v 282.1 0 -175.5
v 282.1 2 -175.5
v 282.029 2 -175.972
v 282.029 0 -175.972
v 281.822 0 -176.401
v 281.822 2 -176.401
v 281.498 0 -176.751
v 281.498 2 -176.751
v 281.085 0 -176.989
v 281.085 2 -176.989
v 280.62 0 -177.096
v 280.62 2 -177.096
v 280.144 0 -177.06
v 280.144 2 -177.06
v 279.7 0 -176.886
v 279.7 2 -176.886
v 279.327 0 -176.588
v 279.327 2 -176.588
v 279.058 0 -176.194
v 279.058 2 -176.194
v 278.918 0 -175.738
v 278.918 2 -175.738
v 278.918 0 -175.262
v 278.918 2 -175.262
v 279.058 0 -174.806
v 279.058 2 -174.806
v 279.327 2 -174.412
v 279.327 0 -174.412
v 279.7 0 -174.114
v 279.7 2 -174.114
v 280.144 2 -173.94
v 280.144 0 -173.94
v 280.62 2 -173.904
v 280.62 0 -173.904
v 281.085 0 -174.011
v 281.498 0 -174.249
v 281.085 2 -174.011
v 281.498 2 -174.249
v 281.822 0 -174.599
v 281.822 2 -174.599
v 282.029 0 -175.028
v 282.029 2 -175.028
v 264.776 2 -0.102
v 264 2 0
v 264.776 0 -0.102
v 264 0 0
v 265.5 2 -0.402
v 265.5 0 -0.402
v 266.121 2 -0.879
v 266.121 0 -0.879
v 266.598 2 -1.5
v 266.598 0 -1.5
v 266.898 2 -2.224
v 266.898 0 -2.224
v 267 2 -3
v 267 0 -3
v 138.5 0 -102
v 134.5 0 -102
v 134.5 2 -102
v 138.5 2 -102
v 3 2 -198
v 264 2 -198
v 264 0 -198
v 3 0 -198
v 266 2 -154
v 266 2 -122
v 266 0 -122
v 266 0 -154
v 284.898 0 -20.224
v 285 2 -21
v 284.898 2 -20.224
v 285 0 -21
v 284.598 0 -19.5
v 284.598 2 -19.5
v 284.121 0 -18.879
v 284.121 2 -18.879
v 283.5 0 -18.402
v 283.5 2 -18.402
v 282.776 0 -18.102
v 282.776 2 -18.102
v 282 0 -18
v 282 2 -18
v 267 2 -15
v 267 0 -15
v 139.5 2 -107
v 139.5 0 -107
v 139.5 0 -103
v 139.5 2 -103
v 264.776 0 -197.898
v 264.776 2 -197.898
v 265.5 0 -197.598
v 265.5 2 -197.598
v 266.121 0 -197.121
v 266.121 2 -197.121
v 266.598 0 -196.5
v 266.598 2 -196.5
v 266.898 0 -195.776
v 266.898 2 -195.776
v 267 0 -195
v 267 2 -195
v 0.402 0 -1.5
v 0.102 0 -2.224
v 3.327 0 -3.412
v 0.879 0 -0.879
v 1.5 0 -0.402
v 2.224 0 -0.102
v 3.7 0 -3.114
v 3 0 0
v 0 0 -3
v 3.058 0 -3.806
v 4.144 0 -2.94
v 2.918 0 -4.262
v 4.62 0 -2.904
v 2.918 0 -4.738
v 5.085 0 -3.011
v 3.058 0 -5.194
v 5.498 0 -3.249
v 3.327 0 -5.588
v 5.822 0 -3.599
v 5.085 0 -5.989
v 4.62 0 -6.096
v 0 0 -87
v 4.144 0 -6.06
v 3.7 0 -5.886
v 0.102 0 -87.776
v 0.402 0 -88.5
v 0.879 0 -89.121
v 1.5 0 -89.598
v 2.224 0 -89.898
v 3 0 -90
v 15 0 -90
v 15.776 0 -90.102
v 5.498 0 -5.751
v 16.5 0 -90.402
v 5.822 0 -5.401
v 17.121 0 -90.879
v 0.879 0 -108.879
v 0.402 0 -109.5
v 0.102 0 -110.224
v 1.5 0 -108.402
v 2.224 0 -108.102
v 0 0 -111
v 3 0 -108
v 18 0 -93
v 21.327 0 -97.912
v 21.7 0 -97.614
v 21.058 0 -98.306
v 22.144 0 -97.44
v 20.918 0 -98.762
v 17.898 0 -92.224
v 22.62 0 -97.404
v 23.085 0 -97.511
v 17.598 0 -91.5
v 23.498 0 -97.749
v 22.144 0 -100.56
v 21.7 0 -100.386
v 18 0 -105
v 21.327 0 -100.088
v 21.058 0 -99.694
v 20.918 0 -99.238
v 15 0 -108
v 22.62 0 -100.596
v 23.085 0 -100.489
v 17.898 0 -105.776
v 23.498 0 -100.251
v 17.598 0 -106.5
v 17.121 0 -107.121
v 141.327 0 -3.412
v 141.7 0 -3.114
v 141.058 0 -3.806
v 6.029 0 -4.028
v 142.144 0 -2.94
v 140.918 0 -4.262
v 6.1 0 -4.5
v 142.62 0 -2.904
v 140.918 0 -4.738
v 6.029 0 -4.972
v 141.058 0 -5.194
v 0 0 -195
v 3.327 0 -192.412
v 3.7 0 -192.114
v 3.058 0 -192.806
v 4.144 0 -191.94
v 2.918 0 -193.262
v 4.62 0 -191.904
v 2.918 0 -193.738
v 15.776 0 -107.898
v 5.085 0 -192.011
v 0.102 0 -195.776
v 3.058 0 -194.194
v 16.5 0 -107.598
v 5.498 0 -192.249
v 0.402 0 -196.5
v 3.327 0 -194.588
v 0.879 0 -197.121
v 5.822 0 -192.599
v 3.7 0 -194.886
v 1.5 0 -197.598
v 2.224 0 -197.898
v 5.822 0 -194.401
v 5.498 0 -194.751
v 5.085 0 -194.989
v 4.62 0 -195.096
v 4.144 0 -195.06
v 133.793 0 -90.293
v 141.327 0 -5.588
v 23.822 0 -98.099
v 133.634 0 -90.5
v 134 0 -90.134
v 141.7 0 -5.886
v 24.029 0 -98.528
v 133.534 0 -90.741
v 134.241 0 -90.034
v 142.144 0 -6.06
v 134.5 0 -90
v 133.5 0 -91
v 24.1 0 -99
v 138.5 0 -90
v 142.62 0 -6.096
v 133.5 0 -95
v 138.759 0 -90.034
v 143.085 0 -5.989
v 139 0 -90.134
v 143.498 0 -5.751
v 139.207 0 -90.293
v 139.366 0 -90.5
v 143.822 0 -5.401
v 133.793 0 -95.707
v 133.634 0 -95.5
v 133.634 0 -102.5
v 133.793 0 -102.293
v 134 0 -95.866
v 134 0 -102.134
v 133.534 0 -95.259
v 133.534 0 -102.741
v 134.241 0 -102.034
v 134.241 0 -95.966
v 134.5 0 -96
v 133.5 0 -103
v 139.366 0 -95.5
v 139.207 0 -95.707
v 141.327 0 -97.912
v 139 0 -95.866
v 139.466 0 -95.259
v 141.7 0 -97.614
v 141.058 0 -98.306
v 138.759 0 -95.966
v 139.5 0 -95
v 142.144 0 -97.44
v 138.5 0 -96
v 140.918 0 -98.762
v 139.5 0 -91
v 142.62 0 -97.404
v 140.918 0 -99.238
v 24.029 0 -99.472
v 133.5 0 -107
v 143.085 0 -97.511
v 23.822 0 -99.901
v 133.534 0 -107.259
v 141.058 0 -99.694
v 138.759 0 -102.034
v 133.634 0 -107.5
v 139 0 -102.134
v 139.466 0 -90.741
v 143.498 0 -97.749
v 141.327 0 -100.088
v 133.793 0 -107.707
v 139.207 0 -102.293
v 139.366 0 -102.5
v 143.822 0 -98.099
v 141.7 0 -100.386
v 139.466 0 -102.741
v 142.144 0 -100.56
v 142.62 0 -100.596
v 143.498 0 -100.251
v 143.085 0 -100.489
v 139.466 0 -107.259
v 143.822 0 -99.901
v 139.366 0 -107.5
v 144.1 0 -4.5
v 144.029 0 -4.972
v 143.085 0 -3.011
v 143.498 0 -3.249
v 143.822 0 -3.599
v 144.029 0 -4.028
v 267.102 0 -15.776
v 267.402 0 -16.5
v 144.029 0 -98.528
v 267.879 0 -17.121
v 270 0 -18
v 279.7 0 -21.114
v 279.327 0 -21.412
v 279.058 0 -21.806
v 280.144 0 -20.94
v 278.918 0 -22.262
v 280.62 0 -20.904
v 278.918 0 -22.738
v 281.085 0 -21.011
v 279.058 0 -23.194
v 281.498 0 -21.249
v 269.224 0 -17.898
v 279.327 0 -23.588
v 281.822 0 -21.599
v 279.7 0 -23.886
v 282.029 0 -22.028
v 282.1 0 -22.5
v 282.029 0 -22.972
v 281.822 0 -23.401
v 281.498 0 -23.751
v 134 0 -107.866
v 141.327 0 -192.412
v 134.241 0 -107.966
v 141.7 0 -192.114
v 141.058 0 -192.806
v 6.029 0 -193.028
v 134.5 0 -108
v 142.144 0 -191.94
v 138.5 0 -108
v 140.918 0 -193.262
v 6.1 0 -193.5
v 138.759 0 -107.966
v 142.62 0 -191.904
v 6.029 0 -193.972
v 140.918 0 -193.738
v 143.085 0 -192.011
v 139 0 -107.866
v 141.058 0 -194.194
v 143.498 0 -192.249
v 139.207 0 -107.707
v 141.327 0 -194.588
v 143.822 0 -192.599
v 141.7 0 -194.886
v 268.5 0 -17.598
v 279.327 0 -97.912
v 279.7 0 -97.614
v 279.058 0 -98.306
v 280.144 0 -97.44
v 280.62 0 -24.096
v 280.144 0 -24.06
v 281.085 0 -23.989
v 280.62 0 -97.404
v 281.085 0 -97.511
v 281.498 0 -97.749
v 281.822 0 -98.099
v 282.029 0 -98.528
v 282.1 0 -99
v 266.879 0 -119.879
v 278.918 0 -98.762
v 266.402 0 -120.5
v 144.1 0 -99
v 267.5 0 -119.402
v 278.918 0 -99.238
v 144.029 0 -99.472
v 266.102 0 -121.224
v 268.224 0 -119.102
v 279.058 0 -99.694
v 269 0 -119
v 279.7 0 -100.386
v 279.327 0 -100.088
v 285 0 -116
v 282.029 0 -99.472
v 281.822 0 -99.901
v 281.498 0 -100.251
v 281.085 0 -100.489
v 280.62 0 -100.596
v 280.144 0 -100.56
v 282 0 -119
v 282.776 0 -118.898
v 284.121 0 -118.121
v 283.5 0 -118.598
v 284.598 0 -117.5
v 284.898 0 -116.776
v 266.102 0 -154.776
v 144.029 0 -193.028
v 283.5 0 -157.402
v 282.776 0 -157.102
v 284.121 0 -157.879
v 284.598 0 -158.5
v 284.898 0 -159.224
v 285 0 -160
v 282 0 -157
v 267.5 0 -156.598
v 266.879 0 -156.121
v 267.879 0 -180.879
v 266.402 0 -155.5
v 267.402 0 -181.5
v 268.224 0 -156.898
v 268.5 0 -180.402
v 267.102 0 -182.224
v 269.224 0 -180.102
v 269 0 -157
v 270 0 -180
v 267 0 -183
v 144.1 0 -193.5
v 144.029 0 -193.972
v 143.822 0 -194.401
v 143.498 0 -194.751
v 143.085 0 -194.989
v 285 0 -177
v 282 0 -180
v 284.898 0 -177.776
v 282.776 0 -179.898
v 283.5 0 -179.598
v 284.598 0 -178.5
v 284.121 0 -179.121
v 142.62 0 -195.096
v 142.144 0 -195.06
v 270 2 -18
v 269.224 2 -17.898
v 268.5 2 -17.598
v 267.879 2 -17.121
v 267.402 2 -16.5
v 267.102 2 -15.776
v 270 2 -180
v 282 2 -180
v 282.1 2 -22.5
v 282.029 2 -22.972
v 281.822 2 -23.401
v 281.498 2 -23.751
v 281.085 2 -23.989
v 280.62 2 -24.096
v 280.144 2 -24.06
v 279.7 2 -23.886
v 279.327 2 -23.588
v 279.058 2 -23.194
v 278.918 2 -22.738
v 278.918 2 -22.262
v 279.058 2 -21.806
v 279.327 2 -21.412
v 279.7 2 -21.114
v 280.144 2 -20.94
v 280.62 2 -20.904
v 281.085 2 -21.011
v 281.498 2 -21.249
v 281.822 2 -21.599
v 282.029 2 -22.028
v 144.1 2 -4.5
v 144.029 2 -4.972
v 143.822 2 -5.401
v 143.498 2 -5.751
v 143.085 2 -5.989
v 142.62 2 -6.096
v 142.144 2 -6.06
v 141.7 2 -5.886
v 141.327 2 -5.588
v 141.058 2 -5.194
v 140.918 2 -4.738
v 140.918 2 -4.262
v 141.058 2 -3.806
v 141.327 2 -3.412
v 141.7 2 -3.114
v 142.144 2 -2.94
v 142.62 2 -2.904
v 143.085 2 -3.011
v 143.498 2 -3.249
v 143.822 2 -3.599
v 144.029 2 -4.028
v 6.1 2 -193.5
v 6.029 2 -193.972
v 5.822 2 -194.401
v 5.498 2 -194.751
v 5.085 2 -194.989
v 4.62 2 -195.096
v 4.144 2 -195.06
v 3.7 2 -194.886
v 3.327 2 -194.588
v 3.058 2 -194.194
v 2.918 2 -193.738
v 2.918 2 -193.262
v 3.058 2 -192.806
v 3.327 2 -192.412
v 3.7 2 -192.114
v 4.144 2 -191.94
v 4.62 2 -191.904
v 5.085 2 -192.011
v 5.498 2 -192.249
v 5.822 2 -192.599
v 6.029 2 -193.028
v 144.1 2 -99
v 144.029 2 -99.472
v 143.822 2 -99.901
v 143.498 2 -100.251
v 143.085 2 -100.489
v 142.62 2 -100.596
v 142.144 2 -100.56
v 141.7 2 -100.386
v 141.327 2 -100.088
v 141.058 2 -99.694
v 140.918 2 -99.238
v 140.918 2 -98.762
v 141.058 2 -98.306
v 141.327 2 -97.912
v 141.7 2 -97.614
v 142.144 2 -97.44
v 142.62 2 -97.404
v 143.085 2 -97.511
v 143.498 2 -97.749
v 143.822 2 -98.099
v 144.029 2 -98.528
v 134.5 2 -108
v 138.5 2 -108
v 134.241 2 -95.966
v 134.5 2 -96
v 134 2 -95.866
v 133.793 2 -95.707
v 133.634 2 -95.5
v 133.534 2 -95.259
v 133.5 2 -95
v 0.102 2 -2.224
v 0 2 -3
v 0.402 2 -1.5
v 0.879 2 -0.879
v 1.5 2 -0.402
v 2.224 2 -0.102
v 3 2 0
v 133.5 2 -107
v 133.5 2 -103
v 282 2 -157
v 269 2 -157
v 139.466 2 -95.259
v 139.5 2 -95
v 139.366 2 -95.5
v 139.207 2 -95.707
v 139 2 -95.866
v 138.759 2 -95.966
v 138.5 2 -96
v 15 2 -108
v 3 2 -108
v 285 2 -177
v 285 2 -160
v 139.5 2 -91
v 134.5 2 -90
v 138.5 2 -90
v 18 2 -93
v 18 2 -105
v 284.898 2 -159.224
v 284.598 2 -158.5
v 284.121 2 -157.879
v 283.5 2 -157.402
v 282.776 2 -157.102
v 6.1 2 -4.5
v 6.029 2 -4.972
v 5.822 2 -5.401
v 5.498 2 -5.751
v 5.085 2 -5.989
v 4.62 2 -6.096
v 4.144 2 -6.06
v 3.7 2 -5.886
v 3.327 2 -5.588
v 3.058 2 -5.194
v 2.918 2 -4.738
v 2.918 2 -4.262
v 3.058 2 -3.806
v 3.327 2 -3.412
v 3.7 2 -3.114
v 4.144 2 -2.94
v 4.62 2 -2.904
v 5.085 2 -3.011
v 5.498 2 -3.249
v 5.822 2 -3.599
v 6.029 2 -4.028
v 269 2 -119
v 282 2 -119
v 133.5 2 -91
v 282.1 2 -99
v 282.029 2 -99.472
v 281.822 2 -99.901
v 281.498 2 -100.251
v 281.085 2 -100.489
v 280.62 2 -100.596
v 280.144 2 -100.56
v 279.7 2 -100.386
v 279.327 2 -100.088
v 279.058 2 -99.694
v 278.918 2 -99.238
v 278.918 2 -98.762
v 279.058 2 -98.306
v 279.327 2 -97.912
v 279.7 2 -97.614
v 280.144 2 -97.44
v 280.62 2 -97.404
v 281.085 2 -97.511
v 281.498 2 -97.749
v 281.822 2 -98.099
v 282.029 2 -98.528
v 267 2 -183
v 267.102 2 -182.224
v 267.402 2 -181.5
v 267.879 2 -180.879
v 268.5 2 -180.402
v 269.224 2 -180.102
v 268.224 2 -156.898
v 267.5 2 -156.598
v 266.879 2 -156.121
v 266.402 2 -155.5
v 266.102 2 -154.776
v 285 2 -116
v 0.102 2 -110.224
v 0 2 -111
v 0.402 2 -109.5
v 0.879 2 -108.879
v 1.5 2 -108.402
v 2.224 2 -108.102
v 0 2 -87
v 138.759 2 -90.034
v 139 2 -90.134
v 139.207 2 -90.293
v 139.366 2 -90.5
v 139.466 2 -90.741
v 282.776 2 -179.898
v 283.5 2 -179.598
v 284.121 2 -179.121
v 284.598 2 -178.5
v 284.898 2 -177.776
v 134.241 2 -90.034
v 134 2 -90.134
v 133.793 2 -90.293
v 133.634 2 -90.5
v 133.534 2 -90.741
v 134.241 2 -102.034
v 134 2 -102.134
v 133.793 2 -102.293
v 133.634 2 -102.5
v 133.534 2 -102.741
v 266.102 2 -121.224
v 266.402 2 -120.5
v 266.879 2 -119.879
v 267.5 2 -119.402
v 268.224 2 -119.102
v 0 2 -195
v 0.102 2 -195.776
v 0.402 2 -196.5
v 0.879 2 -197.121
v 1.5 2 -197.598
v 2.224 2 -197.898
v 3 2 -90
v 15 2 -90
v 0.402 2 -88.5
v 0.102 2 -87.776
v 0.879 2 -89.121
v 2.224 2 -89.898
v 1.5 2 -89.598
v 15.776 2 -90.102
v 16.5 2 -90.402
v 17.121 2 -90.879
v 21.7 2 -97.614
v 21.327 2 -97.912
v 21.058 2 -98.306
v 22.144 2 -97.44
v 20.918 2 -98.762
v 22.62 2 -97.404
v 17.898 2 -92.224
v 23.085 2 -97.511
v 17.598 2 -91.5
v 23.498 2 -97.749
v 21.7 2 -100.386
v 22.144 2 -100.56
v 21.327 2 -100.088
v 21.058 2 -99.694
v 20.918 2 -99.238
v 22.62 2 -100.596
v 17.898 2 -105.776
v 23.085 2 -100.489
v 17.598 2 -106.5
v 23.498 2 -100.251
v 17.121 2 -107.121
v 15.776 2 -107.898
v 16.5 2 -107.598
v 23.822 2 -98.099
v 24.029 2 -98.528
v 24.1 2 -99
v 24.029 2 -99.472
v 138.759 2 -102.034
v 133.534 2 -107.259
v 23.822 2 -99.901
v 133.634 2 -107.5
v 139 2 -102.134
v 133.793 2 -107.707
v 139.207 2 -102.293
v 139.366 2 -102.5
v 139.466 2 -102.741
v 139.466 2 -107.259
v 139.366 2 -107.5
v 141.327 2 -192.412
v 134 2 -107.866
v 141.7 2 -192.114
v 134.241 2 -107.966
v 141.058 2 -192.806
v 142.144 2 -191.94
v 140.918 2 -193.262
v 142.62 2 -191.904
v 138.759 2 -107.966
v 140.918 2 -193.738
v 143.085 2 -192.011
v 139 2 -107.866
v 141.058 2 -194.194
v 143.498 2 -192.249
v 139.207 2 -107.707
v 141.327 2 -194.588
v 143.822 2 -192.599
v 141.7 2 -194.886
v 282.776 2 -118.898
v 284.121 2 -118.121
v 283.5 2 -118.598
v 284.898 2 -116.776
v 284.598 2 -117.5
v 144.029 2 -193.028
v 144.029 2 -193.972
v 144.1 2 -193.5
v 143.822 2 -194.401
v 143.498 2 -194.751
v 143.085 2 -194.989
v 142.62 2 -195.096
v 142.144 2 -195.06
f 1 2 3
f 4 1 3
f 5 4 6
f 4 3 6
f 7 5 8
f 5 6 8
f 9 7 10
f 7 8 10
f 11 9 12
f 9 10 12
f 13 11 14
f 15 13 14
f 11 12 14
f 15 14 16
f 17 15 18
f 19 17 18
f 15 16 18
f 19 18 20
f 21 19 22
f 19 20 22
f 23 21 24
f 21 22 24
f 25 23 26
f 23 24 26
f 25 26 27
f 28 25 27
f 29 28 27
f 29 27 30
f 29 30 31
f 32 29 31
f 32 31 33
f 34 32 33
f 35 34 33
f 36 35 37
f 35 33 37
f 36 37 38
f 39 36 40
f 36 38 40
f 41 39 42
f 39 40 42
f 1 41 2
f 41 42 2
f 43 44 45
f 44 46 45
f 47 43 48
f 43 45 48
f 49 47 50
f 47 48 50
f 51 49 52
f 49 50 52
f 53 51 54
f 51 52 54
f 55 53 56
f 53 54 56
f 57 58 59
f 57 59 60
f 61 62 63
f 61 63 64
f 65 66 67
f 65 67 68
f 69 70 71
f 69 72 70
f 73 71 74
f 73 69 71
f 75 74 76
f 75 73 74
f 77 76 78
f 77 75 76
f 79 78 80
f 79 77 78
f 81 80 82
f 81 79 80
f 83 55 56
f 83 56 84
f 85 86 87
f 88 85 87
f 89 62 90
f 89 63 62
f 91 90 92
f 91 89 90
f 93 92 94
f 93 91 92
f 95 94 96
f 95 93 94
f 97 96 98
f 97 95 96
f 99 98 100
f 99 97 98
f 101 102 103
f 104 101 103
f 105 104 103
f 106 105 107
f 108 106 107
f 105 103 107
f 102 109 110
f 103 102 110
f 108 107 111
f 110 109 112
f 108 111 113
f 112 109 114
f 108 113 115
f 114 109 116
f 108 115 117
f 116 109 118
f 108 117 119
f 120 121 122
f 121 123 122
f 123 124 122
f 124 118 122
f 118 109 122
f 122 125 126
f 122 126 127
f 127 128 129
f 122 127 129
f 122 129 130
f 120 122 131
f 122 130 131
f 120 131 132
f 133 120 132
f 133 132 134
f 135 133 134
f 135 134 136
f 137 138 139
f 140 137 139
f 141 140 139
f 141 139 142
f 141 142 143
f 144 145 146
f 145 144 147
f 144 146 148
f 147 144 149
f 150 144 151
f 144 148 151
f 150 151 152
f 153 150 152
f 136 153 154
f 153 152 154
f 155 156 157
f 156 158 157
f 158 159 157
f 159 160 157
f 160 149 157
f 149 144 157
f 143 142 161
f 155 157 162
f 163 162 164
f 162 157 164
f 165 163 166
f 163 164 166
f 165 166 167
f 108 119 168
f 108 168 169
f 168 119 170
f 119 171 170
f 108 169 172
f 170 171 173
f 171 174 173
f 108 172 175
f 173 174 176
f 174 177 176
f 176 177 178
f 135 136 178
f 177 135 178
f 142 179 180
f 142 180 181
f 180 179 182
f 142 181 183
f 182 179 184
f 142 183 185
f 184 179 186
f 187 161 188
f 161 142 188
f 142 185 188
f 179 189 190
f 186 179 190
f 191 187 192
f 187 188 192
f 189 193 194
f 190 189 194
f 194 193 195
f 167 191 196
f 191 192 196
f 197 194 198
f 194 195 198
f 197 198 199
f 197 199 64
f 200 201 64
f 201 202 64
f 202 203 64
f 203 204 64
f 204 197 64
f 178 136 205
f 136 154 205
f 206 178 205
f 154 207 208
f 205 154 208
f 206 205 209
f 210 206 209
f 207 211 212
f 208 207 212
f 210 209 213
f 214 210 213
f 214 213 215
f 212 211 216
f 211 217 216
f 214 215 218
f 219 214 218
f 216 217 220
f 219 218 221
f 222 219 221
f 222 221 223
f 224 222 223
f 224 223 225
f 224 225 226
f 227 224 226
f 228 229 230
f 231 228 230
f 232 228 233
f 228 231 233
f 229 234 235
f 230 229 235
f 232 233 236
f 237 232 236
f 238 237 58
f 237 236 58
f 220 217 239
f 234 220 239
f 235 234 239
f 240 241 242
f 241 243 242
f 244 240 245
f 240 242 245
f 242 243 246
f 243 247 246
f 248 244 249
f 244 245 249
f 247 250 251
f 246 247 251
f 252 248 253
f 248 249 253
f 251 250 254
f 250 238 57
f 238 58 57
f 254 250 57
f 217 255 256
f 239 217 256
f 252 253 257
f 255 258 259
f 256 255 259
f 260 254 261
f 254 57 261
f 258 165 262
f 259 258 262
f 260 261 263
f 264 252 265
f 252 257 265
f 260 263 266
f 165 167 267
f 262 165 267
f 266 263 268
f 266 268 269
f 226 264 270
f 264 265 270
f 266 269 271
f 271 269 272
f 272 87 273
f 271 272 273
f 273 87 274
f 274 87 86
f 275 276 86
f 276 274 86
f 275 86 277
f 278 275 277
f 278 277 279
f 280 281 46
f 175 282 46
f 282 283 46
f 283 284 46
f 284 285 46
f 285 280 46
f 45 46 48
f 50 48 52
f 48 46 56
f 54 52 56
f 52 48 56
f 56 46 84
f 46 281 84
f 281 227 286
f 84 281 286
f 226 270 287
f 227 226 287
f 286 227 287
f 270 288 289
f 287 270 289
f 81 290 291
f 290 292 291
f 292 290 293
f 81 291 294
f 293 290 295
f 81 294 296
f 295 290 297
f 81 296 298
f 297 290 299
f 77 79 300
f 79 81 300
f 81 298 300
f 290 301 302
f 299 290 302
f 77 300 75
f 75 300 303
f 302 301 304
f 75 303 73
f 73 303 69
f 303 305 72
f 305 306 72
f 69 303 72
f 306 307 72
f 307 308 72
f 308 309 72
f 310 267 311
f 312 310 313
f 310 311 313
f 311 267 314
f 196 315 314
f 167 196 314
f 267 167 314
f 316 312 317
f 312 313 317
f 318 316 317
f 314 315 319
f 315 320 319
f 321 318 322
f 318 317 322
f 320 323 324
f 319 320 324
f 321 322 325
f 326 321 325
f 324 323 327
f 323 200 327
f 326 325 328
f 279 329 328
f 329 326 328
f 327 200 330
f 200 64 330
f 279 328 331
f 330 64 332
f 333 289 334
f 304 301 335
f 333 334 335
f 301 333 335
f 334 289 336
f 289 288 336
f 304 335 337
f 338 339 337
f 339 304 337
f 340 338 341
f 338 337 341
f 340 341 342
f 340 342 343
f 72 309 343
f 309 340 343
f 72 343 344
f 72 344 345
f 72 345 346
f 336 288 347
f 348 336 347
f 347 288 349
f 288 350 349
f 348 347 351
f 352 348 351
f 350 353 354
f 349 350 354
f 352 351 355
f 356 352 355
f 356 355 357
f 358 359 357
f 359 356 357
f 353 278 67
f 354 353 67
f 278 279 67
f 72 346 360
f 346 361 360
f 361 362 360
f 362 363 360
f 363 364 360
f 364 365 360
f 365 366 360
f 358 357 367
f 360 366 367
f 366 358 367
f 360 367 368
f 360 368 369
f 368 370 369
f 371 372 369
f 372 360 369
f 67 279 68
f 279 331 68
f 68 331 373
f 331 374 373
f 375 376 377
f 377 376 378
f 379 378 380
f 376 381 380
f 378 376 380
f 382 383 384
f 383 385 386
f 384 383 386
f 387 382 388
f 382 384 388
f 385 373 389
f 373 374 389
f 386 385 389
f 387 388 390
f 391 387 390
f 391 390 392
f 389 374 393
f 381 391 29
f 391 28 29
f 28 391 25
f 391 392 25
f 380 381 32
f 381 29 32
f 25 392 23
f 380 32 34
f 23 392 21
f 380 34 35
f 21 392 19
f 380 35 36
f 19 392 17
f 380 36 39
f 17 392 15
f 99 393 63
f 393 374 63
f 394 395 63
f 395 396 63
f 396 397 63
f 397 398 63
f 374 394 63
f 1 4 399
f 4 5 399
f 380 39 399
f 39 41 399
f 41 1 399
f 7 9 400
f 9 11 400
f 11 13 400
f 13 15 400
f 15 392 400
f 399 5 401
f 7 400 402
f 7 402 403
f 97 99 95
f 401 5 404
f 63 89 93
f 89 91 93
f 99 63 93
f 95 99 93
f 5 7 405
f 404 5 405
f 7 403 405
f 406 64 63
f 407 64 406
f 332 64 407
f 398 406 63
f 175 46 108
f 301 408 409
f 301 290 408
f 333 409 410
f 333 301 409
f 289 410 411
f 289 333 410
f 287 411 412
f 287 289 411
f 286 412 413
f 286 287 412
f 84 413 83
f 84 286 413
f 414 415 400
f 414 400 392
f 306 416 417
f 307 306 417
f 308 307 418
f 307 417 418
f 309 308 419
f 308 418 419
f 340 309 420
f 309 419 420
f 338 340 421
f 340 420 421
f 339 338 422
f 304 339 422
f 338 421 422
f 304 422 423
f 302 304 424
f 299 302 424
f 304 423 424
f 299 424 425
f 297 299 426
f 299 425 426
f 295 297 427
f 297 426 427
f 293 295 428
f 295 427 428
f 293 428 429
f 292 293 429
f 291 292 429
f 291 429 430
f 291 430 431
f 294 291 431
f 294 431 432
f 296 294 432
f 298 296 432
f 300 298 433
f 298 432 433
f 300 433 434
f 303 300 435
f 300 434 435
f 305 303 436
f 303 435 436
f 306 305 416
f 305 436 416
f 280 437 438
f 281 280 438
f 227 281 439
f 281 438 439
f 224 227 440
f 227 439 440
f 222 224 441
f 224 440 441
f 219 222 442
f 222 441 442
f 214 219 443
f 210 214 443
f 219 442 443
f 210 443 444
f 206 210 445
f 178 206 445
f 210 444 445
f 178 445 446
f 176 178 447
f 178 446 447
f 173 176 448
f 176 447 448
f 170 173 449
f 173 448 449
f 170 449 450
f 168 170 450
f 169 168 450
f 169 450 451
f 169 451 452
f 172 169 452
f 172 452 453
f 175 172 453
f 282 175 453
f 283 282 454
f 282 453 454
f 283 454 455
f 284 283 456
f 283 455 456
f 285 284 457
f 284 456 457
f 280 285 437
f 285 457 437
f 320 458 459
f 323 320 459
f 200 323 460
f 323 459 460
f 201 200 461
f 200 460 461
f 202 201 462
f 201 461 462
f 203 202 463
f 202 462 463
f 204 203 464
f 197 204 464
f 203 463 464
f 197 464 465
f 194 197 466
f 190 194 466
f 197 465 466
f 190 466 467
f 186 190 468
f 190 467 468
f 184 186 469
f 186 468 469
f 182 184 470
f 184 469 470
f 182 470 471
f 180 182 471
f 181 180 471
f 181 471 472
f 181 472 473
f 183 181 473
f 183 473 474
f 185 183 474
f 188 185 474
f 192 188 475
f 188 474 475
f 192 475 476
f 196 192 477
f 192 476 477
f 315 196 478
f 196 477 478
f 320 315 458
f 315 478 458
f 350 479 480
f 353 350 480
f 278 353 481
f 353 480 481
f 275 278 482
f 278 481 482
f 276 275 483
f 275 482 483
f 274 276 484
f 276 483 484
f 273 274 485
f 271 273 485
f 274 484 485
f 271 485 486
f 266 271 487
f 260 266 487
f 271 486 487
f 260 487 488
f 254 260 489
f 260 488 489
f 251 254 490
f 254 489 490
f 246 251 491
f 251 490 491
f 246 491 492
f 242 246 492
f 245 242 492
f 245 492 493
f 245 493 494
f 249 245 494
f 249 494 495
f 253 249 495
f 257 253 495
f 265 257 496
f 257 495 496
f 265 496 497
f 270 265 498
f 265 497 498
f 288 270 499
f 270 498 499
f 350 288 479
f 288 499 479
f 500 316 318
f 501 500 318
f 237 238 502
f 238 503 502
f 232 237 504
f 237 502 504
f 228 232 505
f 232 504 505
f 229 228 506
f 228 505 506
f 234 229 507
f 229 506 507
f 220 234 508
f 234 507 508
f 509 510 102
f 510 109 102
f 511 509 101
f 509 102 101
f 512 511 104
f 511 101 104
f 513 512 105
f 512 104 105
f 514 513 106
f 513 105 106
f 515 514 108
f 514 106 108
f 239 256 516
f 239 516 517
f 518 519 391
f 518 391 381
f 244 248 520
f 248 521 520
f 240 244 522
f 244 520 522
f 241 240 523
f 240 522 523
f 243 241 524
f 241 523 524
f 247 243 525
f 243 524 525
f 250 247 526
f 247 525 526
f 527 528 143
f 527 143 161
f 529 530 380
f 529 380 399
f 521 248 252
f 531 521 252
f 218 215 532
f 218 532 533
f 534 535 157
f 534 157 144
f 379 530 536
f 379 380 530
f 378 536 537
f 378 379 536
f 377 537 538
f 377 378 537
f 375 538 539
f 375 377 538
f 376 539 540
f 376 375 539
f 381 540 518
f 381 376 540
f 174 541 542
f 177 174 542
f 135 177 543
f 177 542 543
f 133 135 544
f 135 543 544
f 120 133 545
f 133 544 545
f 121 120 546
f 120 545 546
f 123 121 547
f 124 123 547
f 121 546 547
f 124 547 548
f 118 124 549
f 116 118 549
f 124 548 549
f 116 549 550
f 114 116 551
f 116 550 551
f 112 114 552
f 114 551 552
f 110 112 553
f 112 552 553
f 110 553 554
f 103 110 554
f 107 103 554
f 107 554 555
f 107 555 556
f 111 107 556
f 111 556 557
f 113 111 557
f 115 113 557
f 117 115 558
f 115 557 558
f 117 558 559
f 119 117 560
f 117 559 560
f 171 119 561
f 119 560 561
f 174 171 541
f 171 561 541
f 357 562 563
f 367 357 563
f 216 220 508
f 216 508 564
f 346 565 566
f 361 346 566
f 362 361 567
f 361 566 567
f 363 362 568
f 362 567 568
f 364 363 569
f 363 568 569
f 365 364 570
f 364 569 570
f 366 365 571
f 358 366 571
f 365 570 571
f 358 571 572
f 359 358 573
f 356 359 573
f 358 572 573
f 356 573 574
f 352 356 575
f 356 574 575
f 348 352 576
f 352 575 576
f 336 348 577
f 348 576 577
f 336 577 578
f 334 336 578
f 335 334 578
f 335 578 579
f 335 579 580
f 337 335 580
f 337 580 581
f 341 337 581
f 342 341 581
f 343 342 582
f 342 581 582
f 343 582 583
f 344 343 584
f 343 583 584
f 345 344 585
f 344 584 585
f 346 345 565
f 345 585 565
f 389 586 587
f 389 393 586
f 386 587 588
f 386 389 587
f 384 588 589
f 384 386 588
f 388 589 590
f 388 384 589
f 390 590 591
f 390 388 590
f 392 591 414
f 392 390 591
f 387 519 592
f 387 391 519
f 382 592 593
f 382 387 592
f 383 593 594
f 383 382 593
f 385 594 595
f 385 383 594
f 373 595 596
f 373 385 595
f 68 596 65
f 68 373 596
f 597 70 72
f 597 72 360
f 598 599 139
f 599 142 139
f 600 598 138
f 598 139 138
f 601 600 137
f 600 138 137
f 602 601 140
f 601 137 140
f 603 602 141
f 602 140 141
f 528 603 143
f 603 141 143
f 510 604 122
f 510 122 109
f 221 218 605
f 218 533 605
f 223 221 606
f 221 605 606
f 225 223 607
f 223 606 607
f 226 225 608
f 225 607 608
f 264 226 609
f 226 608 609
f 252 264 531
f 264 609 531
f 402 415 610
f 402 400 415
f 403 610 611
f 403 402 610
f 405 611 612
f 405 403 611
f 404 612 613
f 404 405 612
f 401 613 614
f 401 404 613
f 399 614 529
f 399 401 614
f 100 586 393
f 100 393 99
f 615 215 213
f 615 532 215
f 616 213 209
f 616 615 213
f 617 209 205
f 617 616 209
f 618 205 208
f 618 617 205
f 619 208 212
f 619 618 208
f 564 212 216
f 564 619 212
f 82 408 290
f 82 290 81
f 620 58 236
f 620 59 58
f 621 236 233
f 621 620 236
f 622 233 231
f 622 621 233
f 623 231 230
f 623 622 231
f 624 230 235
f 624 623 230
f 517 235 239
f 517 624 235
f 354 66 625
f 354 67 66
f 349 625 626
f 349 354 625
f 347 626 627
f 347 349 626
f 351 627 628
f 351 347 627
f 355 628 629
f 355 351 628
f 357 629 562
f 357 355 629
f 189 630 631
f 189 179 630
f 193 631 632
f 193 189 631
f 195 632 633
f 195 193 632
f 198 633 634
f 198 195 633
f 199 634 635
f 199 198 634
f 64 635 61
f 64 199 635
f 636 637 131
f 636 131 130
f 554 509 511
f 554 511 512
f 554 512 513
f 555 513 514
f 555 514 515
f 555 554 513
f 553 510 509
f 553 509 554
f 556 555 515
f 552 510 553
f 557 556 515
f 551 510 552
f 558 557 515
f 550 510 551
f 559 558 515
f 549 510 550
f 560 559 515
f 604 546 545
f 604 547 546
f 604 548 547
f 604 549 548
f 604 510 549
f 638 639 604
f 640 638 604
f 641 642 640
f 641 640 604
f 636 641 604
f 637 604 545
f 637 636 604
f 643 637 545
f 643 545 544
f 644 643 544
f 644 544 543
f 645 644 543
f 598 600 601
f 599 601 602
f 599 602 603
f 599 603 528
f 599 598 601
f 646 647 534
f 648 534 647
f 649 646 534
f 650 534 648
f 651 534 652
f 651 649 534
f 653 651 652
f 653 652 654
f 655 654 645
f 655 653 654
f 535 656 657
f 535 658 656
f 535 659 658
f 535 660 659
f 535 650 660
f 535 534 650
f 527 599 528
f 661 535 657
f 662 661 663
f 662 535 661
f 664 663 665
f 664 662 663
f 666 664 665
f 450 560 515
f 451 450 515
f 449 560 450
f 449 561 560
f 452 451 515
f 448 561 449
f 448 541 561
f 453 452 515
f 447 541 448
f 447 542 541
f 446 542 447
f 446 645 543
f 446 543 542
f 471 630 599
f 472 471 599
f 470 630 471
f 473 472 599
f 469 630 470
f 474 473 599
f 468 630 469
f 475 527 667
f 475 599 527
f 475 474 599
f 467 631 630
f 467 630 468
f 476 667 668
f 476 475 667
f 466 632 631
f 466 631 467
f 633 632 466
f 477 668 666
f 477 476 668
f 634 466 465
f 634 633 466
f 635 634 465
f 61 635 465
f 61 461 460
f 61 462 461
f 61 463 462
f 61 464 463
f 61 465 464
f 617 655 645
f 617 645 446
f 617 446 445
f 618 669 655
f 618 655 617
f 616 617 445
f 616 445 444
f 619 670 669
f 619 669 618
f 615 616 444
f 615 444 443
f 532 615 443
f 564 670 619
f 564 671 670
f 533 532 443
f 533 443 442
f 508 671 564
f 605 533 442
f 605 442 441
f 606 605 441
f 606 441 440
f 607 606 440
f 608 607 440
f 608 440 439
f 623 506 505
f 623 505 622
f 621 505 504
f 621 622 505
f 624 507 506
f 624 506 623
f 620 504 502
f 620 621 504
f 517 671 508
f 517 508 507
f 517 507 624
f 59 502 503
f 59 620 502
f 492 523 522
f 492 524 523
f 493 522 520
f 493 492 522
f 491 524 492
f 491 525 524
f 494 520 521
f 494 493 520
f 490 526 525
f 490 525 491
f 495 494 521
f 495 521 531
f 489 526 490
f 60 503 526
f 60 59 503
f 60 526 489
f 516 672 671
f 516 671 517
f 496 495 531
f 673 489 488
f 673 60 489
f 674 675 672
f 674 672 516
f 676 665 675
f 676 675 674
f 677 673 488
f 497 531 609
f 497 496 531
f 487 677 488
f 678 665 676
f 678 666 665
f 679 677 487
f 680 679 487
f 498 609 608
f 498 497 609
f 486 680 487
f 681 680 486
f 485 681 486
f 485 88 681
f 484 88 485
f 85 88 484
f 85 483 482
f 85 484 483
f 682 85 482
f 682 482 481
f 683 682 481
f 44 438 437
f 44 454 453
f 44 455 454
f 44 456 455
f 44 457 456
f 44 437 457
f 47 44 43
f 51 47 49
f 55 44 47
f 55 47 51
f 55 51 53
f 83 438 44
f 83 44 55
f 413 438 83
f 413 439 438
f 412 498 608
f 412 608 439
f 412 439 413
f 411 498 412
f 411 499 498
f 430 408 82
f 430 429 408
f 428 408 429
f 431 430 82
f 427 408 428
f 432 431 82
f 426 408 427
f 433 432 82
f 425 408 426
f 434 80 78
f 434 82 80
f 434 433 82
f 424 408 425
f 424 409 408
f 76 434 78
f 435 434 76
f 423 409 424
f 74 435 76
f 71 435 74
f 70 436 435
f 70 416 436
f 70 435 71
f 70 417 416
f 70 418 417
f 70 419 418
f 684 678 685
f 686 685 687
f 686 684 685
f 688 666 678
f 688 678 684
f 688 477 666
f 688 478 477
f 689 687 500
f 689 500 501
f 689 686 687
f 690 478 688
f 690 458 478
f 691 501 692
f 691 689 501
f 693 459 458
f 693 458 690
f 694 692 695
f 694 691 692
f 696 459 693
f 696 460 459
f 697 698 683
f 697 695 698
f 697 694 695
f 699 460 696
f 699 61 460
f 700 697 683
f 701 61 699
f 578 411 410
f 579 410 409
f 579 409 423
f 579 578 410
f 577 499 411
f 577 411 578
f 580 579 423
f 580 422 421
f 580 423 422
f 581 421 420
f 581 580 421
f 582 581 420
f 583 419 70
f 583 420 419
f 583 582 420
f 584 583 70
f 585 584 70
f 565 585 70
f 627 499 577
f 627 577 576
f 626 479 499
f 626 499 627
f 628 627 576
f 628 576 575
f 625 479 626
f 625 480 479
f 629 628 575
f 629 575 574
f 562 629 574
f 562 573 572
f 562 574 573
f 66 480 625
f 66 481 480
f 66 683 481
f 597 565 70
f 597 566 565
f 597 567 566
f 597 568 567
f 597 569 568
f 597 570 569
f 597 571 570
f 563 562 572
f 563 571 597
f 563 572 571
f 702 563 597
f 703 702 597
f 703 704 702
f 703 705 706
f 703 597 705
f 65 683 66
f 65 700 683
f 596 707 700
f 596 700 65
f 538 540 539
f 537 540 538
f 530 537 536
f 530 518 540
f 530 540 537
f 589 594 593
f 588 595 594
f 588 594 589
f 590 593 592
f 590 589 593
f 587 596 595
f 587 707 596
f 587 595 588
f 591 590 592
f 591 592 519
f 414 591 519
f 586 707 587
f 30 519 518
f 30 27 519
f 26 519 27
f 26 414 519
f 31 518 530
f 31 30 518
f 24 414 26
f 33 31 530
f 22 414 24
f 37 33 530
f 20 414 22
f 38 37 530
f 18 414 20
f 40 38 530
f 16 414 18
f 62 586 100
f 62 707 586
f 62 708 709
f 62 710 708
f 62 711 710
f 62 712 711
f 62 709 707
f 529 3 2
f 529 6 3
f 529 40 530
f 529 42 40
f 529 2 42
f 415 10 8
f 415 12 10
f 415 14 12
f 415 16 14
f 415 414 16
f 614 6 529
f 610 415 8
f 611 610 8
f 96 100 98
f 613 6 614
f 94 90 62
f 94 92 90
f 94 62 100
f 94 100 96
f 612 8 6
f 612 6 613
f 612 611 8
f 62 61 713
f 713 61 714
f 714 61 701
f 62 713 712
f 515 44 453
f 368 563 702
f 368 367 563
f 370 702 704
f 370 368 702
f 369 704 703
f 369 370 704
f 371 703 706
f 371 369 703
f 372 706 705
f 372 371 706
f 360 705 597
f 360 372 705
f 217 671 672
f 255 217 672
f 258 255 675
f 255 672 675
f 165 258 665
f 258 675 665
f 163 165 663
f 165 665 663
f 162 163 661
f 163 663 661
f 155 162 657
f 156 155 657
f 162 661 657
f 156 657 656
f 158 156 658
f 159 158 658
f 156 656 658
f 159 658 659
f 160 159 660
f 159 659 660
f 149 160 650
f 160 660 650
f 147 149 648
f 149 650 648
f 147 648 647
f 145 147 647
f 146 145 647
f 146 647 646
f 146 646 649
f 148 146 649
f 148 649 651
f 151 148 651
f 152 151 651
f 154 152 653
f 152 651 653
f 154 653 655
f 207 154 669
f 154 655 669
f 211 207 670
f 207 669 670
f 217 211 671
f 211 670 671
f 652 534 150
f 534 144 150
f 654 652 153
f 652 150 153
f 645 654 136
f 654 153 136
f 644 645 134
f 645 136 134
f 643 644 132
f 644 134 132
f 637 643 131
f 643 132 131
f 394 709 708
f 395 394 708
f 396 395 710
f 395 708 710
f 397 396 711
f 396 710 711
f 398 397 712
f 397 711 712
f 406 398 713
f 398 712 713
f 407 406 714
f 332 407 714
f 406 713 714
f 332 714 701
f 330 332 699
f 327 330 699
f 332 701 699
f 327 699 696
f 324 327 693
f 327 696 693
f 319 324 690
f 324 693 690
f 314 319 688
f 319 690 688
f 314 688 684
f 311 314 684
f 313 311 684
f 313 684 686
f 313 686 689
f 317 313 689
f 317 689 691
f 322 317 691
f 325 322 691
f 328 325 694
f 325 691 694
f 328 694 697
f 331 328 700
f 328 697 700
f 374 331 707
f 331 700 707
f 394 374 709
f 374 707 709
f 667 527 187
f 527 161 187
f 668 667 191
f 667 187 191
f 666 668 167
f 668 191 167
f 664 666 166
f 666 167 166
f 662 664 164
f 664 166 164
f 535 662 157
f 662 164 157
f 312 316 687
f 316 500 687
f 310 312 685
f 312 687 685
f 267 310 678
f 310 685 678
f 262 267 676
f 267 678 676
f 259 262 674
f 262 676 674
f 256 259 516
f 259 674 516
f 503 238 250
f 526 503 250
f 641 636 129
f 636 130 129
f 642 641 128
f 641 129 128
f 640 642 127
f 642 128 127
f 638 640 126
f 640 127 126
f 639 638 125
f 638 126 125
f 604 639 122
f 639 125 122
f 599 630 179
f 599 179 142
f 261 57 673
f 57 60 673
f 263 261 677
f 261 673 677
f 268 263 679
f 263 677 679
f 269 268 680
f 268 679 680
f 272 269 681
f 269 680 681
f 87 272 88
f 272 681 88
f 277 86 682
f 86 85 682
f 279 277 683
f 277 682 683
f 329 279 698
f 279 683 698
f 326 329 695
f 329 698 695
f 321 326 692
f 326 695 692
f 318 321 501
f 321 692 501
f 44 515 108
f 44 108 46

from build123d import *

# Parameters (mm, degrees)
CROQUIS1_R               = 1.6
SALIENTE_EXTRUIR1_DEPTH  = 2
REDONDEO1_R              = 3
CROQUIS3_W               = 19
CROQUIS3_H               = 38
SORTIDA_CABLE_LLIT_DEPTH = 3
REDONDEO3_R              = 3
CROQUIS4_W               = 6
CROQUIS4_H               = 6
FORAT_TERMISTOR_DEPTH    = 3
REDONDEO4_R              = 1


with BuildPart() as part:
    # Croquis1 → Saliente-Extruir1 (new body)
    with BuildSketch(Plane(origin=(0, 2, 0), x_dir=(1, 0, 0), z_dir=(0, 1, 0))):
        Polygon((0, 198), (0, 108), (18, 108), (18, 90), (0, 90), (0, 0), (267, 0), (267, 18), (285, 18), (285, 180), (267, 180), (267, 198), align=None)
        with Locations((142.5, 193.5)):
            Circle(CROQUIS1_R, mode=Mode.SUBTRACT)
        with Locations((4.5, 193.5)):
            Circle(CROQUIS1_R, mode=Mode.SUBTRACT)
        with Locations((280.5, 22.5)):
            Circle(CROQUIS1_R, mode=Mode.SUBTRACT)
        with Locations((280.5, 175.5)):
            Circle(CROQUIS1_R, mode=Mode.SUBTRACT)
        with Locations((280.5, 99)):
            Circle(CROQUIS1_R, mode=Mode.SUBTRACT)
        with Locations((142.5, 4.5)):
            Circle(CROQUIS1_R, mode=Mode.SUBTRACT)
        with Locations((4.5, 4.5)):
            Circle(CROQUIS1_R, mode=Mode.SUBTRACT)
        with Locations((142.5, 99)):
            Circle(CROQUIS1_R, mode=Mode.SUBTRACT)
        with Locations((22.5, 99)):
            Circle(CROQUIS1_R, mode=Mode.SUBTRACT)
    extrude(amount=-SALIENTE_EXTRUIR1_DEPTH)

    # Redondeo1
    redondeo1_edges = [part.edges().sort_by_distance(p)[0] for p in [
        (267, 1, -198),
        (267, 1, -180),
        (285, 1, -180),
        (285, 1, -18),
        (267, 1, -18),
        (267, 1, 0),
        (0, 1, 0),
        (0, 1, -90),
        (18, 1, -90),
        (18, 1, -108),
        (0, 1, -108),
        (0, 1, -198),
    ]]
    fillet(redondeo1_edges, radius=REDONDEO1_R)

    # Croquis3 → Sortida cable llit (cut, through all)
    with BuildSketch(Plane(origin=(0, 2, 0), x_dir=(1, 0, 0), z_dir=(0, 1, 0))):
        with Locations((275.5, 138)):
            Rectangle(CROQUIS3_W, CROQUIS3_H)
    extrude(amount=-SORTIDA_CABLE_LLIT_DEPTH, mode=Mode.SUBTRACT)

    # Redondeo3
    redondeo3_edges = [part.edges().sort_by_distance(p)[0] for p in [
        (285, 1, -157),
        (285, 1, -119),
        (266, 1, -119),
        (266, 1, -157),
    ]]
    fillet(redondeo3_edges, radius=REDONDEO3_R)

    # Croquis4 → Forat termistor (cut, through all)
    with BuildSketch(Plane.XZ):
        with Locations((136.5, -93)):
            Rectangle(CROQUIS4_W, CROQUIS4_H)
        with Locations((136.5, -105)):
            Rectangle(CROQUIS4_W, CROQUIS4_H)
    extrude(amount=-FORAT_TERMISTOR_DEPTH, mode=Mode.SUBTRACT)

    # Redondeo4
    redondeo4_edges = [part.edges().sort_by_distance(p)[0] for p in [
        (133.5, 1, -96),
        (133.5, 1, -90),
        (139.5, 1, -90),
        (139.5, 1, -96),
        (139.5, 1, -108),
        (133.5, 1, -108),
        (133.5, 1, -102),
        (139.5, 1, -102),
    ]]
    fillet(redondeo4_edges, radius=REDONDEO4_R)


solid = part.part
